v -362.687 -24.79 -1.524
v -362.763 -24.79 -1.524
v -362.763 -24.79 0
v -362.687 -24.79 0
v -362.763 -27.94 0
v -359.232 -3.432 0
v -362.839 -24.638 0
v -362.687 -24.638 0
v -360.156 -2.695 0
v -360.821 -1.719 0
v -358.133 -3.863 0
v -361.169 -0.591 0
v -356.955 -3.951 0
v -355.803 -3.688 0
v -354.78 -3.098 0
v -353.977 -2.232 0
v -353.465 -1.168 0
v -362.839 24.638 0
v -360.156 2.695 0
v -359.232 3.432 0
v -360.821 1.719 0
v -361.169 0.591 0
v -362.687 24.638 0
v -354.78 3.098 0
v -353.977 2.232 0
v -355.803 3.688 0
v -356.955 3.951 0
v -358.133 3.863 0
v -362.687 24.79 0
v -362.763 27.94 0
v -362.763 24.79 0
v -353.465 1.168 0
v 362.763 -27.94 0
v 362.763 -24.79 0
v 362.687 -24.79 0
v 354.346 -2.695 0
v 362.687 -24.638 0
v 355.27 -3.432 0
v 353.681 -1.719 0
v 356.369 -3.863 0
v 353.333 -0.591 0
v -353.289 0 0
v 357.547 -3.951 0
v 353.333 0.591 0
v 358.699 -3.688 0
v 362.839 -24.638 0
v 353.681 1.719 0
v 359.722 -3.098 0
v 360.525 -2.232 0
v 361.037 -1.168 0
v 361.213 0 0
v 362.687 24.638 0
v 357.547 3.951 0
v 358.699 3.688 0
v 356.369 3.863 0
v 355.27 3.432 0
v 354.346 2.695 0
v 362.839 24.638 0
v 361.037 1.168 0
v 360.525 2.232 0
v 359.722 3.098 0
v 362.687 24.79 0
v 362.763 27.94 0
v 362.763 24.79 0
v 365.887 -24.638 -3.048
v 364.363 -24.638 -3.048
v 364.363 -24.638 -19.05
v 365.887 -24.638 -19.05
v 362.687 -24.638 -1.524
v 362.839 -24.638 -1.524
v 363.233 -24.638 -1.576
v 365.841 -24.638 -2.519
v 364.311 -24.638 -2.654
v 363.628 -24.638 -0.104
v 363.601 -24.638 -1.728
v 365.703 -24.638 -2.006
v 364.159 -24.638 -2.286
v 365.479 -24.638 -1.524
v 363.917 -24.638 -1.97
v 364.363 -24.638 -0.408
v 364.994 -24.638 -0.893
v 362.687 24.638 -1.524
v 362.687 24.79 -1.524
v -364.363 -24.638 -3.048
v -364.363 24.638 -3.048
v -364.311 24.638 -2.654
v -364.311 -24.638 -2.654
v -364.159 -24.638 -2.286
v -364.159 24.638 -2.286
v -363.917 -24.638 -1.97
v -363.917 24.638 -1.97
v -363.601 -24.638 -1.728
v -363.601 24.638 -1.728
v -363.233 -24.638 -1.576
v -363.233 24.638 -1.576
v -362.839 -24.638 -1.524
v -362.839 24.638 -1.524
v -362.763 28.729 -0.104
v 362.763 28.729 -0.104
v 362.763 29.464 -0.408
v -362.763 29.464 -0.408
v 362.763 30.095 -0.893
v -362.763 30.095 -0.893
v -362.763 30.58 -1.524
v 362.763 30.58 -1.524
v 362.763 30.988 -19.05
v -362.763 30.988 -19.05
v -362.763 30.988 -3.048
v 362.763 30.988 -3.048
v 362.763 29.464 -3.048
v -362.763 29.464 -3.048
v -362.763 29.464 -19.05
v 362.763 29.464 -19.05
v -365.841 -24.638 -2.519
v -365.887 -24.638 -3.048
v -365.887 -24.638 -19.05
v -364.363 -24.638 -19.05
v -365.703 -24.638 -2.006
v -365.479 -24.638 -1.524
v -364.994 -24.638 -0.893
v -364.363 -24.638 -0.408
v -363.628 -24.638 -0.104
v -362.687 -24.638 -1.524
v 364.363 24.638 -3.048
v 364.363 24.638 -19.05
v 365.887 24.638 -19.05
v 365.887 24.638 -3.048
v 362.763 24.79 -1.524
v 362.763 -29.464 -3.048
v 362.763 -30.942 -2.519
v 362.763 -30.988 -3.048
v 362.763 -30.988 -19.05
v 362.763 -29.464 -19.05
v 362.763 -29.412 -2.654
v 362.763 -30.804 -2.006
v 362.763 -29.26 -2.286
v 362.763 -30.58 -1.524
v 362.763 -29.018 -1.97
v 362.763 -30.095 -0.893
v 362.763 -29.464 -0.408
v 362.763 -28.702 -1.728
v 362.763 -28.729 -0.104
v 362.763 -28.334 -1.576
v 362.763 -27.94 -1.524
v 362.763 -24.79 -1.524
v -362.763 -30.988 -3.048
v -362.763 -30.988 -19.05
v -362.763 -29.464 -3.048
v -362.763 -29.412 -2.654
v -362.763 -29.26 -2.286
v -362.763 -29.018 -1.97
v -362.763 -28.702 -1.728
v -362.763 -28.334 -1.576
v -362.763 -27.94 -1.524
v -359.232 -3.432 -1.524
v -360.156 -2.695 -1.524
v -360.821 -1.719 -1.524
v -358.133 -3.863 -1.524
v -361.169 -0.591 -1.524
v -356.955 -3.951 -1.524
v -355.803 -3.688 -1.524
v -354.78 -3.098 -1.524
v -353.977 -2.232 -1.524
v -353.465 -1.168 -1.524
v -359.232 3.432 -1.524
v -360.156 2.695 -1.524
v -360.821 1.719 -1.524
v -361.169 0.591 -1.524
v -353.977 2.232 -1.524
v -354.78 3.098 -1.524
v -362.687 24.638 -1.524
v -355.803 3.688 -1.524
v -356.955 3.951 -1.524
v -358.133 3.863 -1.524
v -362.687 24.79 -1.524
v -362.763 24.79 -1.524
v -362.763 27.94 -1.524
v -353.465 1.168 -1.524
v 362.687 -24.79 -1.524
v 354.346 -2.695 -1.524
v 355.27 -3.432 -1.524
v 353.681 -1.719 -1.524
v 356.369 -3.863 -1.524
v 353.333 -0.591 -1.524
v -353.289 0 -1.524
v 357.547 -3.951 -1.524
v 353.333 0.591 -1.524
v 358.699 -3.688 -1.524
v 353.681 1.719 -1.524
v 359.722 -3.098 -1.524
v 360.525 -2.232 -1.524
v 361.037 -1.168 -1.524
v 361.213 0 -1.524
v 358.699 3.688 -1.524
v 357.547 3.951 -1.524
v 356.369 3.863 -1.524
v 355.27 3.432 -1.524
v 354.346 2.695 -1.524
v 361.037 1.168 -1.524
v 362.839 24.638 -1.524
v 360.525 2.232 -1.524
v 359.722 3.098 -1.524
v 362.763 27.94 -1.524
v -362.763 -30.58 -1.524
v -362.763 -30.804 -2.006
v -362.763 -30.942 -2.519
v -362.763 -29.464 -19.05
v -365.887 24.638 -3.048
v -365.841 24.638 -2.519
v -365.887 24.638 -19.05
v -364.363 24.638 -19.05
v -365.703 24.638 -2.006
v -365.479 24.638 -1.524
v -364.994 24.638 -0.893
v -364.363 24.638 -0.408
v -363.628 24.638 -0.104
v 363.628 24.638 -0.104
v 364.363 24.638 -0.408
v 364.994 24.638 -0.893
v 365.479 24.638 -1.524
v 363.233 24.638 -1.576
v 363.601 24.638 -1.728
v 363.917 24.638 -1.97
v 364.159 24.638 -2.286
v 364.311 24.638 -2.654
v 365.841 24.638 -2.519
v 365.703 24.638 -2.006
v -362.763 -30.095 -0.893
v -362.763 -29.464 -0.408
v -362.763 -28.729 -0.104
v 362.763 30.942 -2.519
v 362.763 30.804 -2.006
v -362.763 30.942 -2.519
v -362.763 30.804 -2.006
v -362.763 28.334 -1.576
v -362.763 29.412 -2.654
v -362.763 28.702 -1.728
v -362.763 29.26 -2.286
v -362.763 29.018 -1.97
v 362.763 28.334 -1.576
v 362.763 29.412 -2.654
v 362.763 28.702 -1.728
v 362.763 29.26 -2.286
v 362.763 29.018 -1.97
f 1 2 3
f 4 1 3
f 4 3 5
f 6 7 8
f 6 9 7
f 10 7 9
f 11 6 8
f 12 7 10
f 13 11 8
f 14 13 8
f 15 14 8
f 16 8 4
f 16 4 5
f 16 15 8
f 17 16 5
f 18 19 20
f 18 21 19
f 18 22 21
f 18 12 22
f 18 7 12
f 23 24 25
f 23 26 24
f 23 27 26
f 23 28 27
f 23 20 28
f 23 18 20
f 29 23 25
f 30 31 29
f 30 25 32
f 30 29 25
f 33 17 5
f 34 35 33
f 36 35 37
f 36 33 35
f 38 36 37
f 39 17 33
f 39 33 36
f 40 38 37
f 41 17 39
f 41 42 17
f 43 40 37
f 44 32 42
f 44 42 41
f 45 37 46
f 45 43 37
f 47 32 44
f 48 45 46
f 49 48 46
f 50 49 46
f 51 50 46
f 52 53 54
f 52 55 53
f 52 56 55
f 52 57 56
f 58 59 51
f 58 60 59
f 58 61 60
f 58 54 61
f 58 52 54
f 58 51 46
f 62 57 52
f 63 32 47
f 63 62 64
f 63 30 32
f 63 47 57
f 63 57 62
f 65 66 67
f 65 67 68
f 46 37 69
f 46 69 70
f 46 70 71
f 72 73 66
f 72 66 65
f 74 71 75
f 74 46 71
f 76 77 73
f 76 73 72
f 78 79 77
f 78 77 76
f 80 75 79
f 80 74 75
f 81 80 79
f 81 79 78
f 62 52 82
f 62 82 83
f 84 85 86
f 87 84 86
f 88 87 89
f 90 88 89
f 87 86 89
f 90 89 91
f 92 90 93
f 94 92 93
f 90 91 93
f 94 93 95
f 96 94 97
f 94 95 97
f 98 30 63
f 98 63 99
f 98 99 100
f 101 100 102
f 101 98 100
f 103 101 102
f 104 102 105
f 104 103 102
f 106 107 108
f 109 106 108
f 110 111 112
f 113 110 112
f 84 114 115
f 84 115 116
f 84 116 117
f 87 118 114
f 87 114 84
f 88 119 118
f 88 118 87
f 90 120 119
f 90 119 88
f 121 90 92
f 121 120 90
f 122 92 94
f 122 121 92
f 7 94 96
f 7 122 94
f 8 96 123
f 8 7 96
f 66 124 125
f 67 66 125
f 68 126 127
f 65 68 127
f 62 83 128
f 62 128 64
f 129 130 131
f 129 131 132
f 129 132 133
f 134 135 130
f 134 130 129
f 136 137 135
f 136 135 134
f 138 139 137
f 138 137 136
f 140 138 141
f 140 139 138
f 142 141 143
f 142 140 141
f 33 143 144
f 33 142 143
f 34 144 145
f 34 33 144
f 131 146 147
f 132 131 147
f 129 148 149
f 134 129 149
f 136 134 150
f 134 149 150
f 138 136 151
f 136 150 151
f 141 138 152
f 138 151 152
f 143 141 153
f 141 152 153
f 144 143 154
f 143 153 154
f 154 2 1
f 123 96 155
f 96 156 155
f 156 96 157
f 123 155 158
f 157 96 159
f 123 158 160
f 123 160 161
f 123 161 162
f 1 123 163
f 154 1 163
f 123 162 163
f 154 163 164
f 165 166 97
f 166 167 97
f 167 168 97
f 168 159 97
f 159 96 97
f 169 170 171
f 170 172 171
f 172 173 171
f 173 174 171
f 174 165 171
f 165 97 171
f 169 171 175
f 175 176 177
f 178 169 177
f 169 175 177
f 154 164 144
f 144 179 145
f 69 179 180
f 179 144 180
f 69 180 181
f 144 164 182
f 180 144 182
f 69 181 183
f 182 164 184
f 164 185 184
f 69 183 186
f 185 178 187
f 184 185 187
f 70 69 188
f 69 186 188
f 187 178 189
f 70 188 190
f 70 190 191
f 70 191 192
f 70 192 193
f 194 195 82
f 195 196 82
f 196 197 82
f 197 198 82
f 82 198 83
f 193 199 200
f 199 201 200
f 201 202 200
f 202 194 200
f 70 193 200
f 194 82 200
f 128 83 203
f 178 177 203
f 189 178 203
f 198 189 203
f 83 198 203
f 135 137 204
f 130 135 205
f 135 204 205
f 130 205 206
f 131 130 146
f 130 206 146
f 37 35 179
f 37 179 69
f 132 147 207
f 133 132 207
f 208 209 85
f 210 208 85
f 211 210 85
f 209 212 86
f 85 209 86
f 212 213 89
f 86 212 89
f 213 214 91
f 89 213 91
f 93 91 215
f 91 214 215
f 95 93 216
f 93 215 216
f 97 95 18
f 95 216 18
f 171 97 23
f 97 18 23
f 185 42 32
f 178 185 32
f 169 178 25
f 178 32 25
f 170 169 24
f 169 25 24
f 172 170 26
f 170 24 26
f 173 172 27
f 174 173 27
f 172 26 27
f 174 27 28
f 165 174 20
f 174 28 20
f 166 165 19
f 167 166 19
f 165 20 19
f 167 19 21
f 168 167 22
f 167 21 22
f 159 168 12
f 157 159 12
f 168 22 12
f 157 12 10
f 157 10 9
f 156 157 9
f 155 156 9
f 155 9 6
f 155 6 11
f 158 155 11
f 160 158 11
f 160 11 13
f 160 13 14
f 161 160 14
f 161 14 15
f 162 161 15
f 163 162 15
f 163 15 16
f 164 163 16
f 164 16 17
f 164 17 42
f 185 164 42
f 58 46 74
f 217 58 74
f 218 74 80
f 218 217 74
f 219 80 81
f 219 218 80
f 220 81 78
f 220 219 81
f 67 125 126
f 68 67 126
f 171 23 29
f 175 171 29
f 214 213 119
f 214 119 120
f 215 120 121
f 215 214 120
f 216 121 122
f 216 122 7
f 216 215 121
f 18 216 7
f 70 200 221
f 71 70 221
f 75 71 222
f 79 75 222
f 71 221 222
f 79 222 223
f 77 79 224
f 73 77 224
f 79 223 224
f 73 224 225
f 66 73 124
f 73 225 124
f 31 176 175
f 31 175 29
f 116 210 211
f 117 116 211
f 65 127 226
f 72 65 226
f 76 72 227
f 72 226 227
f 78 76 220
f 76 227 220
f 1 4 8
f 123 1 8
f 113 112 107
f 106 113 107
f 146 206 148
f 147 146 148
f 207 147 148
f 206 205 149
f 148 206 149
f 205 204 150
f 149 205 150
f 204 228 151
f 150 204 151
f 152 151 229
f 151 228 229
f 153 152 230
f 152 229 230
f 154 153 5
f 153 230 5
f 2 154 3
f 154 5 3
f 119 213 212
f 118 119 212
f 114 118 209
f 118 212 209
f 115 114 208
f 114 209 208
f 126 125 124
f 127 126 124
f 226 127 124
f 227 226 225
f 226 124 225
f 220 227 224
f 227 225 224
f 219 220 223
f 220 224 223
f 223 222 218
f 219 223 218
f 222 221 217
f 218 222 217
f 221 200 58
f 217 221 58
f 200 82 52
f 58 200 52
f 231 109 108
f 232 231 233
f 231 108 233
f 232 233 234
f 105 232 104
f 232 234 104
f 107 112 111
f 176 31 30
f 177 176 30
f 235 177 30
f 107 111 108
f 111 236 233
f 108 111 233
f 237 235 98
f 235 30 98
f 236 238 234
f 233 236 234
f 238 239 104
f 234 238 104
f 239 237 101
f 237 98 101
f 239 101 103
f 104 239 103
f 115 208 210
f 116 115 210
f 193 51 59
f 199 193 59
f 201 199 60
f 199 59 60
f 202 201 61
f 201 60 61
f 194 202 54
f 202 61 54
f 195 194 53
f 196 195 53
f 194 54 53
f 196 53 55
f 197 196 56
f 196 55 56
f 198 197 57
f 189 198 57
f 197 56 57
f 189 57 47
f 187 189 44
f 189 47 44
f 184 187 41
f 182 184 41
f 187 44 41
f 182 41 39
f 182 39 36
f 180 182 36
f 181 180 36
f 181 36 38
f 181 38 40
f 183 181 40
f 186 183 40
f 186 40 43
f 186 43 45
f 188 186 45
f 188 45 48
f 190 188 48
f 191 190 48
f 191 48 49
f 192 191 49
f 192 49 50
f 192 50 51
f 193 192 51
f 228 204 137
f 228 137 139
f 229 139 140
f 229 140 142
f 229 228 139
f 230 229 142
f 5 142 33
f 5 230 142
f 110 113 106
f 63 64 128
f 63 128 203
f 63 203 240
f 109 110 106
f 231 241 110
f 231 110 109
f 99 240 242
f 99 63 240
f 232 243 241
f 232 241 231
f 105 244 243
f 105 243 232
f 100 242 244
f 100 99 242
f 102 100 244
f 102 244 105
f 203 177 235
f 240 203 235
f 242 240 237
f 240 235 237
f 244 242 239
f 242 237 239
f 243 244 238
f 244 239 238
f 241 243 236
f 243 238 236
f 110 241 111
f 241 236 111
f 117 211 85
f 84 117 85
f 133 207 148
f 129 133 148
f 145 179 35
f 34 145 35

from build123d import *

# Parameters (mm, degrees)
CROQUIS1_W                   = 731.774
CROQUIS1_H                   = 61.976
BRIDA_BASE1_DEPTH            = 1.524
CROQUIS6_W                   = 3.1242
CROQUIS6_H                   = 6.35
CORTAR_EXTRUIR1_DEPTH        = 368.200048324
BRIDA_START                  = -362.7628
BRIDA_DE_ARISTA1_DEPTH       = 725.5256
BRIDA_START_2                = 6.35
BRIDA_DE_ARISTA1_2_DEPTH     = 49.276
BRIDA_DE_ARISTA1_3_DEPTH     = 725.5256
BRIDA_DE_ARISTA1_4_OUTLINE_W = 0.1524
BRIDA_DE_ARISTA1_4_OUTLINE_H = 1.524
BRIDA_DE_ARISTA1_4_DEPTH     = 0.0762
BRIDA_START_3                = 362.6866
BRIDA_DE_ARISTA1_5_OUTLINE_W = 0.1524
BRIDA_DE_ARISTA1_5_OUTLINE_H = 1.524
BRIDA_DE_ARISTA1_5_DEPTH     = 0.0762
BRIDA_DE_ARISTA1_6_DEPTH     = 49.276
CROQUIS19_R                  = 3.9624
CORTAR_EXTRUIR2_DEPTH        = 368.690706183


# Read off the part's stored shape, not the designer's step: Brida de arista1
# Sheet-metal steps are written as plain solids
with BuildPart() as part:
    # Croquis1 → Brida base1 (new body)
    with BuildSketch(Plane.XY):
        Rectangle(CROQUIS1_W, CROQUIS1_H)
    extrude(amount=-BRIDA_BASE1_DEPTH)

    # Croquis6 → Cortar-Extruir1 (cut, through all)
    with BuildSketch(Plane.XY):
        with Locations((364.3249, 27.813)):
            Rectangle(CROQUIS6_W, CROQUIS6_H)
        with Locations((364.3249, -27.813)):
            Rectangle(CROQUIS6_W, CROQUIS6_H)
        with Locations((-364.3249, -27.813)):
            Rectangle(CROQUIS6_W, CROQUIS6_H)
        with Locations((-364.3249, 27.813)):
            Rectangle(CROQUIS6_W, CROQUIS6_H)
    extrude(amount=-CORTAR_EXTRUIR1_DEPTH, mode=Mode.SUBTRACT)

    # Brida de arista1 outline → Brida de arista1 (add)
    with BuildSketch(Plane.YZ.offset(BRIDA_START)):
        with BuildLine():
            Line((30.988, -19.05), (30.988, -3.048))
            ThreePointArc((30.988, -3.048), (30.884141918, -2.259119551), (30.579645431, -1.524))
            Line((30.579645431, -1.524), (27.94, -1.524))
            ThreePointArc((27.94, -1.524), (29.017630735, -1.970369265), (29.464, -3.048))
            Line((29.464, -3.048), (29.464, -19.05))
            Line((29.464, -19.05), (30.988, -19.05))
        make_face()
        with BuildLine():
            ThreePointArc((-29.464, -3.048), (-29.017630735, -1.970369265), (-27.94, -1.524))
            Line((-27.94, -1.524), (-30.579645431, -1.524))
            ThreePointArc((-30.579645431, -1.524), (-30.884141918, -2.259119551), (-30.988, -3.048))
            Line((-30.988, -3.048), (-30.988, -19.05))
            Line((-30.988, -19.05), (-29.464, -19.05))
            Line((-29.464, -19.05), (-29.464, -3.048))
        make_face()
    extrude(amount=BRIDA_DE_ARISTA1_DEPTH)

    # Brida de arista1 2 outline → Brida de arista1 2 (add)
    with BuildSketch(Plane(origin=(0, 30.988, -1.524), x_dir=(-1, 0, 0), z_dir=(0, -1, 0)).offset(BRIDA_START_2)):
        with BuildLine():
            Line((-364.363, 1.524), (-364.363, 17.526))
            Line((-364.363, 17.526), (-365.887, 17.526))
            Line((-365.887, 17.526), (-365.887, 1.524))
            ThreePointArc((-365.887, 1.524), (-365.783141918, 0.735119551), (-365.478645431, 0))
            Line((-365.478645431, 0), (-362.839, 0))
            ThreePointArc((-362.839, 0), (-363.916630735, 0.446369265), (-364.363, 1.524))
        make_face()
        with BuildLine():
            ThreePointArc((364.363, 1.524), (363.916630735, 0.446369265), (362.839, 0))
            Line((362.839, 0), (365.478645431, 0))
            ThreePointArc((365.478645431, 0), (365.783141918, 0.735119551), (365.887, 1.524))
            Line((365.887, 1.524), (365.887, 17.526))
            Line((365.887, 17.526), (364.363, 17.526))
            Line((364.363, 17.526), (364.363, 1.524))
        make_face()
    extrude(amount=BRIDA_DE_ARISTA1_2_DEPTH)

    # Brida de arista1 3 outline → Brida de arista1 3 (cut)
    with BuildSketch(Plane.YZ.offset(BRIDA_START)):
        with BuildLine():
            ThreePointArc((27.94, 0), (29.464, -0.408354569), (30.579645431, -1.524))
            Line((30.579645431, -1.524), (30.988, -1.524))
            Line((30.988, -1.524), (30.988, 0))
            Line((30.988, 0), (27.94, 0))
        make_face()
        with BuildLine():
            ThreePointArc((-30.579645431, -1.524), (-29.464, -0.408354569), (-27.94, 0))
            Line((-27.94, 0), (-30.988, 0))
            Line((-30.988, 0), (-30.988, -1.524))
            Line((-30.988, -1.524), (-30.579645431, -1.524))
        make_face()
    extrude(amount=BRIDA_DE_ARISTA1_3_DEPTH, mode=Mode.SUBTRACT)

    # Brida de arista1 4 outline → Brida de arista1 4 (cut)
    with BuildSketch(Plane.YZ.offset(BRIDA_START)):
        with Locations((24.7142, -0.762)):
            Rectangle(BRIDA_DE_ARISTA1_4_OUTLINE_W, BRIDA_DE_ARISTA1_4_OUTLINE_H)
        with Locations((-24.7142, -0.762)):
            Rectangle(BRIDA_DE_ARISTA1_4_OUTLINE_W, BRIDA_DE_ARISTA1_4_OUTLINE_H)
    extrude(amount=BRIDA_DE_ARISTA1_4_DEPTH, mode=Mode.SUBTRACT)

    # Brida de arista1 5 outline → Brida de arista1 5 (cut)
    with BuildSketch(Plane.YZ.offset(BRIDA_START_3)):
        with Locations((24.7142, -0.762)):
            Rectangle(BRIDA_DE_ARISTA1_5_OUTLINE_W, BRIDA_DE_ARISTA1_5_OUTLINE_H)
        with Locations((-24.7142, -0.762)):
            Rectangle(BRIDA_DE_ARISTA1_5_OUTLINE_W, BRIDA_DE_ARISTA1_5_OUTLINE_H)
    extrude(amount=BRIDA_DE_ARISTA1_5_DEPTH, mode=Mode.SUBTRACT)

    # Brida de arista1 6 outline → Brida de arista1 6 (cut)
    with BuildSketch(Plane(origin=(0, 30.988, -1.524), x_dir=(-1, 0, 0), z_dir=(0, -1, 0)).offset(BRIDA_START_2)):
        with BuildLine():
            ThreePointArc((-362.839, -1.524), (-364.363, -1.115645431), (-365.478645431, 0))
            Line((-365.478645431, 0), (-365.887, 0))
            Line((-365.887, 0), (-365.887, -1.524))
            Line((-365.887, -1.524), (-362.839, -1.524))
        make_face()
        with BuildLine():
            Line((365.887, 0), (365.478645431, 0))
            ThreePointArc((365.478645431, 0), (364.363, -1.115645431), (362.839, -1.524))
            Line((362.839, -1.524), (365.887, -1.524))
            Line((365.887, -1.524), (365.887, 0))
        make_face()
    extrude(amount=BRIDA_DE_ARISTA1_6_DEPTH, mode=Mode.SUBTRACT)

    # Croquis19 → Cortar-Extruir2 (cut, through all)
    with BuildSketch(Plane.XY):
        with Locations((-357.251, 0)):
            Circle(CROQUIS19_R)
        with Locations((357.251, 0)):
            Circle(CROQUIS19_R)
    extrude(amount=-CORTAR_EXTRUIR2_DEPTH, mode=Mode.SUBTRACT)


solid = part.part
